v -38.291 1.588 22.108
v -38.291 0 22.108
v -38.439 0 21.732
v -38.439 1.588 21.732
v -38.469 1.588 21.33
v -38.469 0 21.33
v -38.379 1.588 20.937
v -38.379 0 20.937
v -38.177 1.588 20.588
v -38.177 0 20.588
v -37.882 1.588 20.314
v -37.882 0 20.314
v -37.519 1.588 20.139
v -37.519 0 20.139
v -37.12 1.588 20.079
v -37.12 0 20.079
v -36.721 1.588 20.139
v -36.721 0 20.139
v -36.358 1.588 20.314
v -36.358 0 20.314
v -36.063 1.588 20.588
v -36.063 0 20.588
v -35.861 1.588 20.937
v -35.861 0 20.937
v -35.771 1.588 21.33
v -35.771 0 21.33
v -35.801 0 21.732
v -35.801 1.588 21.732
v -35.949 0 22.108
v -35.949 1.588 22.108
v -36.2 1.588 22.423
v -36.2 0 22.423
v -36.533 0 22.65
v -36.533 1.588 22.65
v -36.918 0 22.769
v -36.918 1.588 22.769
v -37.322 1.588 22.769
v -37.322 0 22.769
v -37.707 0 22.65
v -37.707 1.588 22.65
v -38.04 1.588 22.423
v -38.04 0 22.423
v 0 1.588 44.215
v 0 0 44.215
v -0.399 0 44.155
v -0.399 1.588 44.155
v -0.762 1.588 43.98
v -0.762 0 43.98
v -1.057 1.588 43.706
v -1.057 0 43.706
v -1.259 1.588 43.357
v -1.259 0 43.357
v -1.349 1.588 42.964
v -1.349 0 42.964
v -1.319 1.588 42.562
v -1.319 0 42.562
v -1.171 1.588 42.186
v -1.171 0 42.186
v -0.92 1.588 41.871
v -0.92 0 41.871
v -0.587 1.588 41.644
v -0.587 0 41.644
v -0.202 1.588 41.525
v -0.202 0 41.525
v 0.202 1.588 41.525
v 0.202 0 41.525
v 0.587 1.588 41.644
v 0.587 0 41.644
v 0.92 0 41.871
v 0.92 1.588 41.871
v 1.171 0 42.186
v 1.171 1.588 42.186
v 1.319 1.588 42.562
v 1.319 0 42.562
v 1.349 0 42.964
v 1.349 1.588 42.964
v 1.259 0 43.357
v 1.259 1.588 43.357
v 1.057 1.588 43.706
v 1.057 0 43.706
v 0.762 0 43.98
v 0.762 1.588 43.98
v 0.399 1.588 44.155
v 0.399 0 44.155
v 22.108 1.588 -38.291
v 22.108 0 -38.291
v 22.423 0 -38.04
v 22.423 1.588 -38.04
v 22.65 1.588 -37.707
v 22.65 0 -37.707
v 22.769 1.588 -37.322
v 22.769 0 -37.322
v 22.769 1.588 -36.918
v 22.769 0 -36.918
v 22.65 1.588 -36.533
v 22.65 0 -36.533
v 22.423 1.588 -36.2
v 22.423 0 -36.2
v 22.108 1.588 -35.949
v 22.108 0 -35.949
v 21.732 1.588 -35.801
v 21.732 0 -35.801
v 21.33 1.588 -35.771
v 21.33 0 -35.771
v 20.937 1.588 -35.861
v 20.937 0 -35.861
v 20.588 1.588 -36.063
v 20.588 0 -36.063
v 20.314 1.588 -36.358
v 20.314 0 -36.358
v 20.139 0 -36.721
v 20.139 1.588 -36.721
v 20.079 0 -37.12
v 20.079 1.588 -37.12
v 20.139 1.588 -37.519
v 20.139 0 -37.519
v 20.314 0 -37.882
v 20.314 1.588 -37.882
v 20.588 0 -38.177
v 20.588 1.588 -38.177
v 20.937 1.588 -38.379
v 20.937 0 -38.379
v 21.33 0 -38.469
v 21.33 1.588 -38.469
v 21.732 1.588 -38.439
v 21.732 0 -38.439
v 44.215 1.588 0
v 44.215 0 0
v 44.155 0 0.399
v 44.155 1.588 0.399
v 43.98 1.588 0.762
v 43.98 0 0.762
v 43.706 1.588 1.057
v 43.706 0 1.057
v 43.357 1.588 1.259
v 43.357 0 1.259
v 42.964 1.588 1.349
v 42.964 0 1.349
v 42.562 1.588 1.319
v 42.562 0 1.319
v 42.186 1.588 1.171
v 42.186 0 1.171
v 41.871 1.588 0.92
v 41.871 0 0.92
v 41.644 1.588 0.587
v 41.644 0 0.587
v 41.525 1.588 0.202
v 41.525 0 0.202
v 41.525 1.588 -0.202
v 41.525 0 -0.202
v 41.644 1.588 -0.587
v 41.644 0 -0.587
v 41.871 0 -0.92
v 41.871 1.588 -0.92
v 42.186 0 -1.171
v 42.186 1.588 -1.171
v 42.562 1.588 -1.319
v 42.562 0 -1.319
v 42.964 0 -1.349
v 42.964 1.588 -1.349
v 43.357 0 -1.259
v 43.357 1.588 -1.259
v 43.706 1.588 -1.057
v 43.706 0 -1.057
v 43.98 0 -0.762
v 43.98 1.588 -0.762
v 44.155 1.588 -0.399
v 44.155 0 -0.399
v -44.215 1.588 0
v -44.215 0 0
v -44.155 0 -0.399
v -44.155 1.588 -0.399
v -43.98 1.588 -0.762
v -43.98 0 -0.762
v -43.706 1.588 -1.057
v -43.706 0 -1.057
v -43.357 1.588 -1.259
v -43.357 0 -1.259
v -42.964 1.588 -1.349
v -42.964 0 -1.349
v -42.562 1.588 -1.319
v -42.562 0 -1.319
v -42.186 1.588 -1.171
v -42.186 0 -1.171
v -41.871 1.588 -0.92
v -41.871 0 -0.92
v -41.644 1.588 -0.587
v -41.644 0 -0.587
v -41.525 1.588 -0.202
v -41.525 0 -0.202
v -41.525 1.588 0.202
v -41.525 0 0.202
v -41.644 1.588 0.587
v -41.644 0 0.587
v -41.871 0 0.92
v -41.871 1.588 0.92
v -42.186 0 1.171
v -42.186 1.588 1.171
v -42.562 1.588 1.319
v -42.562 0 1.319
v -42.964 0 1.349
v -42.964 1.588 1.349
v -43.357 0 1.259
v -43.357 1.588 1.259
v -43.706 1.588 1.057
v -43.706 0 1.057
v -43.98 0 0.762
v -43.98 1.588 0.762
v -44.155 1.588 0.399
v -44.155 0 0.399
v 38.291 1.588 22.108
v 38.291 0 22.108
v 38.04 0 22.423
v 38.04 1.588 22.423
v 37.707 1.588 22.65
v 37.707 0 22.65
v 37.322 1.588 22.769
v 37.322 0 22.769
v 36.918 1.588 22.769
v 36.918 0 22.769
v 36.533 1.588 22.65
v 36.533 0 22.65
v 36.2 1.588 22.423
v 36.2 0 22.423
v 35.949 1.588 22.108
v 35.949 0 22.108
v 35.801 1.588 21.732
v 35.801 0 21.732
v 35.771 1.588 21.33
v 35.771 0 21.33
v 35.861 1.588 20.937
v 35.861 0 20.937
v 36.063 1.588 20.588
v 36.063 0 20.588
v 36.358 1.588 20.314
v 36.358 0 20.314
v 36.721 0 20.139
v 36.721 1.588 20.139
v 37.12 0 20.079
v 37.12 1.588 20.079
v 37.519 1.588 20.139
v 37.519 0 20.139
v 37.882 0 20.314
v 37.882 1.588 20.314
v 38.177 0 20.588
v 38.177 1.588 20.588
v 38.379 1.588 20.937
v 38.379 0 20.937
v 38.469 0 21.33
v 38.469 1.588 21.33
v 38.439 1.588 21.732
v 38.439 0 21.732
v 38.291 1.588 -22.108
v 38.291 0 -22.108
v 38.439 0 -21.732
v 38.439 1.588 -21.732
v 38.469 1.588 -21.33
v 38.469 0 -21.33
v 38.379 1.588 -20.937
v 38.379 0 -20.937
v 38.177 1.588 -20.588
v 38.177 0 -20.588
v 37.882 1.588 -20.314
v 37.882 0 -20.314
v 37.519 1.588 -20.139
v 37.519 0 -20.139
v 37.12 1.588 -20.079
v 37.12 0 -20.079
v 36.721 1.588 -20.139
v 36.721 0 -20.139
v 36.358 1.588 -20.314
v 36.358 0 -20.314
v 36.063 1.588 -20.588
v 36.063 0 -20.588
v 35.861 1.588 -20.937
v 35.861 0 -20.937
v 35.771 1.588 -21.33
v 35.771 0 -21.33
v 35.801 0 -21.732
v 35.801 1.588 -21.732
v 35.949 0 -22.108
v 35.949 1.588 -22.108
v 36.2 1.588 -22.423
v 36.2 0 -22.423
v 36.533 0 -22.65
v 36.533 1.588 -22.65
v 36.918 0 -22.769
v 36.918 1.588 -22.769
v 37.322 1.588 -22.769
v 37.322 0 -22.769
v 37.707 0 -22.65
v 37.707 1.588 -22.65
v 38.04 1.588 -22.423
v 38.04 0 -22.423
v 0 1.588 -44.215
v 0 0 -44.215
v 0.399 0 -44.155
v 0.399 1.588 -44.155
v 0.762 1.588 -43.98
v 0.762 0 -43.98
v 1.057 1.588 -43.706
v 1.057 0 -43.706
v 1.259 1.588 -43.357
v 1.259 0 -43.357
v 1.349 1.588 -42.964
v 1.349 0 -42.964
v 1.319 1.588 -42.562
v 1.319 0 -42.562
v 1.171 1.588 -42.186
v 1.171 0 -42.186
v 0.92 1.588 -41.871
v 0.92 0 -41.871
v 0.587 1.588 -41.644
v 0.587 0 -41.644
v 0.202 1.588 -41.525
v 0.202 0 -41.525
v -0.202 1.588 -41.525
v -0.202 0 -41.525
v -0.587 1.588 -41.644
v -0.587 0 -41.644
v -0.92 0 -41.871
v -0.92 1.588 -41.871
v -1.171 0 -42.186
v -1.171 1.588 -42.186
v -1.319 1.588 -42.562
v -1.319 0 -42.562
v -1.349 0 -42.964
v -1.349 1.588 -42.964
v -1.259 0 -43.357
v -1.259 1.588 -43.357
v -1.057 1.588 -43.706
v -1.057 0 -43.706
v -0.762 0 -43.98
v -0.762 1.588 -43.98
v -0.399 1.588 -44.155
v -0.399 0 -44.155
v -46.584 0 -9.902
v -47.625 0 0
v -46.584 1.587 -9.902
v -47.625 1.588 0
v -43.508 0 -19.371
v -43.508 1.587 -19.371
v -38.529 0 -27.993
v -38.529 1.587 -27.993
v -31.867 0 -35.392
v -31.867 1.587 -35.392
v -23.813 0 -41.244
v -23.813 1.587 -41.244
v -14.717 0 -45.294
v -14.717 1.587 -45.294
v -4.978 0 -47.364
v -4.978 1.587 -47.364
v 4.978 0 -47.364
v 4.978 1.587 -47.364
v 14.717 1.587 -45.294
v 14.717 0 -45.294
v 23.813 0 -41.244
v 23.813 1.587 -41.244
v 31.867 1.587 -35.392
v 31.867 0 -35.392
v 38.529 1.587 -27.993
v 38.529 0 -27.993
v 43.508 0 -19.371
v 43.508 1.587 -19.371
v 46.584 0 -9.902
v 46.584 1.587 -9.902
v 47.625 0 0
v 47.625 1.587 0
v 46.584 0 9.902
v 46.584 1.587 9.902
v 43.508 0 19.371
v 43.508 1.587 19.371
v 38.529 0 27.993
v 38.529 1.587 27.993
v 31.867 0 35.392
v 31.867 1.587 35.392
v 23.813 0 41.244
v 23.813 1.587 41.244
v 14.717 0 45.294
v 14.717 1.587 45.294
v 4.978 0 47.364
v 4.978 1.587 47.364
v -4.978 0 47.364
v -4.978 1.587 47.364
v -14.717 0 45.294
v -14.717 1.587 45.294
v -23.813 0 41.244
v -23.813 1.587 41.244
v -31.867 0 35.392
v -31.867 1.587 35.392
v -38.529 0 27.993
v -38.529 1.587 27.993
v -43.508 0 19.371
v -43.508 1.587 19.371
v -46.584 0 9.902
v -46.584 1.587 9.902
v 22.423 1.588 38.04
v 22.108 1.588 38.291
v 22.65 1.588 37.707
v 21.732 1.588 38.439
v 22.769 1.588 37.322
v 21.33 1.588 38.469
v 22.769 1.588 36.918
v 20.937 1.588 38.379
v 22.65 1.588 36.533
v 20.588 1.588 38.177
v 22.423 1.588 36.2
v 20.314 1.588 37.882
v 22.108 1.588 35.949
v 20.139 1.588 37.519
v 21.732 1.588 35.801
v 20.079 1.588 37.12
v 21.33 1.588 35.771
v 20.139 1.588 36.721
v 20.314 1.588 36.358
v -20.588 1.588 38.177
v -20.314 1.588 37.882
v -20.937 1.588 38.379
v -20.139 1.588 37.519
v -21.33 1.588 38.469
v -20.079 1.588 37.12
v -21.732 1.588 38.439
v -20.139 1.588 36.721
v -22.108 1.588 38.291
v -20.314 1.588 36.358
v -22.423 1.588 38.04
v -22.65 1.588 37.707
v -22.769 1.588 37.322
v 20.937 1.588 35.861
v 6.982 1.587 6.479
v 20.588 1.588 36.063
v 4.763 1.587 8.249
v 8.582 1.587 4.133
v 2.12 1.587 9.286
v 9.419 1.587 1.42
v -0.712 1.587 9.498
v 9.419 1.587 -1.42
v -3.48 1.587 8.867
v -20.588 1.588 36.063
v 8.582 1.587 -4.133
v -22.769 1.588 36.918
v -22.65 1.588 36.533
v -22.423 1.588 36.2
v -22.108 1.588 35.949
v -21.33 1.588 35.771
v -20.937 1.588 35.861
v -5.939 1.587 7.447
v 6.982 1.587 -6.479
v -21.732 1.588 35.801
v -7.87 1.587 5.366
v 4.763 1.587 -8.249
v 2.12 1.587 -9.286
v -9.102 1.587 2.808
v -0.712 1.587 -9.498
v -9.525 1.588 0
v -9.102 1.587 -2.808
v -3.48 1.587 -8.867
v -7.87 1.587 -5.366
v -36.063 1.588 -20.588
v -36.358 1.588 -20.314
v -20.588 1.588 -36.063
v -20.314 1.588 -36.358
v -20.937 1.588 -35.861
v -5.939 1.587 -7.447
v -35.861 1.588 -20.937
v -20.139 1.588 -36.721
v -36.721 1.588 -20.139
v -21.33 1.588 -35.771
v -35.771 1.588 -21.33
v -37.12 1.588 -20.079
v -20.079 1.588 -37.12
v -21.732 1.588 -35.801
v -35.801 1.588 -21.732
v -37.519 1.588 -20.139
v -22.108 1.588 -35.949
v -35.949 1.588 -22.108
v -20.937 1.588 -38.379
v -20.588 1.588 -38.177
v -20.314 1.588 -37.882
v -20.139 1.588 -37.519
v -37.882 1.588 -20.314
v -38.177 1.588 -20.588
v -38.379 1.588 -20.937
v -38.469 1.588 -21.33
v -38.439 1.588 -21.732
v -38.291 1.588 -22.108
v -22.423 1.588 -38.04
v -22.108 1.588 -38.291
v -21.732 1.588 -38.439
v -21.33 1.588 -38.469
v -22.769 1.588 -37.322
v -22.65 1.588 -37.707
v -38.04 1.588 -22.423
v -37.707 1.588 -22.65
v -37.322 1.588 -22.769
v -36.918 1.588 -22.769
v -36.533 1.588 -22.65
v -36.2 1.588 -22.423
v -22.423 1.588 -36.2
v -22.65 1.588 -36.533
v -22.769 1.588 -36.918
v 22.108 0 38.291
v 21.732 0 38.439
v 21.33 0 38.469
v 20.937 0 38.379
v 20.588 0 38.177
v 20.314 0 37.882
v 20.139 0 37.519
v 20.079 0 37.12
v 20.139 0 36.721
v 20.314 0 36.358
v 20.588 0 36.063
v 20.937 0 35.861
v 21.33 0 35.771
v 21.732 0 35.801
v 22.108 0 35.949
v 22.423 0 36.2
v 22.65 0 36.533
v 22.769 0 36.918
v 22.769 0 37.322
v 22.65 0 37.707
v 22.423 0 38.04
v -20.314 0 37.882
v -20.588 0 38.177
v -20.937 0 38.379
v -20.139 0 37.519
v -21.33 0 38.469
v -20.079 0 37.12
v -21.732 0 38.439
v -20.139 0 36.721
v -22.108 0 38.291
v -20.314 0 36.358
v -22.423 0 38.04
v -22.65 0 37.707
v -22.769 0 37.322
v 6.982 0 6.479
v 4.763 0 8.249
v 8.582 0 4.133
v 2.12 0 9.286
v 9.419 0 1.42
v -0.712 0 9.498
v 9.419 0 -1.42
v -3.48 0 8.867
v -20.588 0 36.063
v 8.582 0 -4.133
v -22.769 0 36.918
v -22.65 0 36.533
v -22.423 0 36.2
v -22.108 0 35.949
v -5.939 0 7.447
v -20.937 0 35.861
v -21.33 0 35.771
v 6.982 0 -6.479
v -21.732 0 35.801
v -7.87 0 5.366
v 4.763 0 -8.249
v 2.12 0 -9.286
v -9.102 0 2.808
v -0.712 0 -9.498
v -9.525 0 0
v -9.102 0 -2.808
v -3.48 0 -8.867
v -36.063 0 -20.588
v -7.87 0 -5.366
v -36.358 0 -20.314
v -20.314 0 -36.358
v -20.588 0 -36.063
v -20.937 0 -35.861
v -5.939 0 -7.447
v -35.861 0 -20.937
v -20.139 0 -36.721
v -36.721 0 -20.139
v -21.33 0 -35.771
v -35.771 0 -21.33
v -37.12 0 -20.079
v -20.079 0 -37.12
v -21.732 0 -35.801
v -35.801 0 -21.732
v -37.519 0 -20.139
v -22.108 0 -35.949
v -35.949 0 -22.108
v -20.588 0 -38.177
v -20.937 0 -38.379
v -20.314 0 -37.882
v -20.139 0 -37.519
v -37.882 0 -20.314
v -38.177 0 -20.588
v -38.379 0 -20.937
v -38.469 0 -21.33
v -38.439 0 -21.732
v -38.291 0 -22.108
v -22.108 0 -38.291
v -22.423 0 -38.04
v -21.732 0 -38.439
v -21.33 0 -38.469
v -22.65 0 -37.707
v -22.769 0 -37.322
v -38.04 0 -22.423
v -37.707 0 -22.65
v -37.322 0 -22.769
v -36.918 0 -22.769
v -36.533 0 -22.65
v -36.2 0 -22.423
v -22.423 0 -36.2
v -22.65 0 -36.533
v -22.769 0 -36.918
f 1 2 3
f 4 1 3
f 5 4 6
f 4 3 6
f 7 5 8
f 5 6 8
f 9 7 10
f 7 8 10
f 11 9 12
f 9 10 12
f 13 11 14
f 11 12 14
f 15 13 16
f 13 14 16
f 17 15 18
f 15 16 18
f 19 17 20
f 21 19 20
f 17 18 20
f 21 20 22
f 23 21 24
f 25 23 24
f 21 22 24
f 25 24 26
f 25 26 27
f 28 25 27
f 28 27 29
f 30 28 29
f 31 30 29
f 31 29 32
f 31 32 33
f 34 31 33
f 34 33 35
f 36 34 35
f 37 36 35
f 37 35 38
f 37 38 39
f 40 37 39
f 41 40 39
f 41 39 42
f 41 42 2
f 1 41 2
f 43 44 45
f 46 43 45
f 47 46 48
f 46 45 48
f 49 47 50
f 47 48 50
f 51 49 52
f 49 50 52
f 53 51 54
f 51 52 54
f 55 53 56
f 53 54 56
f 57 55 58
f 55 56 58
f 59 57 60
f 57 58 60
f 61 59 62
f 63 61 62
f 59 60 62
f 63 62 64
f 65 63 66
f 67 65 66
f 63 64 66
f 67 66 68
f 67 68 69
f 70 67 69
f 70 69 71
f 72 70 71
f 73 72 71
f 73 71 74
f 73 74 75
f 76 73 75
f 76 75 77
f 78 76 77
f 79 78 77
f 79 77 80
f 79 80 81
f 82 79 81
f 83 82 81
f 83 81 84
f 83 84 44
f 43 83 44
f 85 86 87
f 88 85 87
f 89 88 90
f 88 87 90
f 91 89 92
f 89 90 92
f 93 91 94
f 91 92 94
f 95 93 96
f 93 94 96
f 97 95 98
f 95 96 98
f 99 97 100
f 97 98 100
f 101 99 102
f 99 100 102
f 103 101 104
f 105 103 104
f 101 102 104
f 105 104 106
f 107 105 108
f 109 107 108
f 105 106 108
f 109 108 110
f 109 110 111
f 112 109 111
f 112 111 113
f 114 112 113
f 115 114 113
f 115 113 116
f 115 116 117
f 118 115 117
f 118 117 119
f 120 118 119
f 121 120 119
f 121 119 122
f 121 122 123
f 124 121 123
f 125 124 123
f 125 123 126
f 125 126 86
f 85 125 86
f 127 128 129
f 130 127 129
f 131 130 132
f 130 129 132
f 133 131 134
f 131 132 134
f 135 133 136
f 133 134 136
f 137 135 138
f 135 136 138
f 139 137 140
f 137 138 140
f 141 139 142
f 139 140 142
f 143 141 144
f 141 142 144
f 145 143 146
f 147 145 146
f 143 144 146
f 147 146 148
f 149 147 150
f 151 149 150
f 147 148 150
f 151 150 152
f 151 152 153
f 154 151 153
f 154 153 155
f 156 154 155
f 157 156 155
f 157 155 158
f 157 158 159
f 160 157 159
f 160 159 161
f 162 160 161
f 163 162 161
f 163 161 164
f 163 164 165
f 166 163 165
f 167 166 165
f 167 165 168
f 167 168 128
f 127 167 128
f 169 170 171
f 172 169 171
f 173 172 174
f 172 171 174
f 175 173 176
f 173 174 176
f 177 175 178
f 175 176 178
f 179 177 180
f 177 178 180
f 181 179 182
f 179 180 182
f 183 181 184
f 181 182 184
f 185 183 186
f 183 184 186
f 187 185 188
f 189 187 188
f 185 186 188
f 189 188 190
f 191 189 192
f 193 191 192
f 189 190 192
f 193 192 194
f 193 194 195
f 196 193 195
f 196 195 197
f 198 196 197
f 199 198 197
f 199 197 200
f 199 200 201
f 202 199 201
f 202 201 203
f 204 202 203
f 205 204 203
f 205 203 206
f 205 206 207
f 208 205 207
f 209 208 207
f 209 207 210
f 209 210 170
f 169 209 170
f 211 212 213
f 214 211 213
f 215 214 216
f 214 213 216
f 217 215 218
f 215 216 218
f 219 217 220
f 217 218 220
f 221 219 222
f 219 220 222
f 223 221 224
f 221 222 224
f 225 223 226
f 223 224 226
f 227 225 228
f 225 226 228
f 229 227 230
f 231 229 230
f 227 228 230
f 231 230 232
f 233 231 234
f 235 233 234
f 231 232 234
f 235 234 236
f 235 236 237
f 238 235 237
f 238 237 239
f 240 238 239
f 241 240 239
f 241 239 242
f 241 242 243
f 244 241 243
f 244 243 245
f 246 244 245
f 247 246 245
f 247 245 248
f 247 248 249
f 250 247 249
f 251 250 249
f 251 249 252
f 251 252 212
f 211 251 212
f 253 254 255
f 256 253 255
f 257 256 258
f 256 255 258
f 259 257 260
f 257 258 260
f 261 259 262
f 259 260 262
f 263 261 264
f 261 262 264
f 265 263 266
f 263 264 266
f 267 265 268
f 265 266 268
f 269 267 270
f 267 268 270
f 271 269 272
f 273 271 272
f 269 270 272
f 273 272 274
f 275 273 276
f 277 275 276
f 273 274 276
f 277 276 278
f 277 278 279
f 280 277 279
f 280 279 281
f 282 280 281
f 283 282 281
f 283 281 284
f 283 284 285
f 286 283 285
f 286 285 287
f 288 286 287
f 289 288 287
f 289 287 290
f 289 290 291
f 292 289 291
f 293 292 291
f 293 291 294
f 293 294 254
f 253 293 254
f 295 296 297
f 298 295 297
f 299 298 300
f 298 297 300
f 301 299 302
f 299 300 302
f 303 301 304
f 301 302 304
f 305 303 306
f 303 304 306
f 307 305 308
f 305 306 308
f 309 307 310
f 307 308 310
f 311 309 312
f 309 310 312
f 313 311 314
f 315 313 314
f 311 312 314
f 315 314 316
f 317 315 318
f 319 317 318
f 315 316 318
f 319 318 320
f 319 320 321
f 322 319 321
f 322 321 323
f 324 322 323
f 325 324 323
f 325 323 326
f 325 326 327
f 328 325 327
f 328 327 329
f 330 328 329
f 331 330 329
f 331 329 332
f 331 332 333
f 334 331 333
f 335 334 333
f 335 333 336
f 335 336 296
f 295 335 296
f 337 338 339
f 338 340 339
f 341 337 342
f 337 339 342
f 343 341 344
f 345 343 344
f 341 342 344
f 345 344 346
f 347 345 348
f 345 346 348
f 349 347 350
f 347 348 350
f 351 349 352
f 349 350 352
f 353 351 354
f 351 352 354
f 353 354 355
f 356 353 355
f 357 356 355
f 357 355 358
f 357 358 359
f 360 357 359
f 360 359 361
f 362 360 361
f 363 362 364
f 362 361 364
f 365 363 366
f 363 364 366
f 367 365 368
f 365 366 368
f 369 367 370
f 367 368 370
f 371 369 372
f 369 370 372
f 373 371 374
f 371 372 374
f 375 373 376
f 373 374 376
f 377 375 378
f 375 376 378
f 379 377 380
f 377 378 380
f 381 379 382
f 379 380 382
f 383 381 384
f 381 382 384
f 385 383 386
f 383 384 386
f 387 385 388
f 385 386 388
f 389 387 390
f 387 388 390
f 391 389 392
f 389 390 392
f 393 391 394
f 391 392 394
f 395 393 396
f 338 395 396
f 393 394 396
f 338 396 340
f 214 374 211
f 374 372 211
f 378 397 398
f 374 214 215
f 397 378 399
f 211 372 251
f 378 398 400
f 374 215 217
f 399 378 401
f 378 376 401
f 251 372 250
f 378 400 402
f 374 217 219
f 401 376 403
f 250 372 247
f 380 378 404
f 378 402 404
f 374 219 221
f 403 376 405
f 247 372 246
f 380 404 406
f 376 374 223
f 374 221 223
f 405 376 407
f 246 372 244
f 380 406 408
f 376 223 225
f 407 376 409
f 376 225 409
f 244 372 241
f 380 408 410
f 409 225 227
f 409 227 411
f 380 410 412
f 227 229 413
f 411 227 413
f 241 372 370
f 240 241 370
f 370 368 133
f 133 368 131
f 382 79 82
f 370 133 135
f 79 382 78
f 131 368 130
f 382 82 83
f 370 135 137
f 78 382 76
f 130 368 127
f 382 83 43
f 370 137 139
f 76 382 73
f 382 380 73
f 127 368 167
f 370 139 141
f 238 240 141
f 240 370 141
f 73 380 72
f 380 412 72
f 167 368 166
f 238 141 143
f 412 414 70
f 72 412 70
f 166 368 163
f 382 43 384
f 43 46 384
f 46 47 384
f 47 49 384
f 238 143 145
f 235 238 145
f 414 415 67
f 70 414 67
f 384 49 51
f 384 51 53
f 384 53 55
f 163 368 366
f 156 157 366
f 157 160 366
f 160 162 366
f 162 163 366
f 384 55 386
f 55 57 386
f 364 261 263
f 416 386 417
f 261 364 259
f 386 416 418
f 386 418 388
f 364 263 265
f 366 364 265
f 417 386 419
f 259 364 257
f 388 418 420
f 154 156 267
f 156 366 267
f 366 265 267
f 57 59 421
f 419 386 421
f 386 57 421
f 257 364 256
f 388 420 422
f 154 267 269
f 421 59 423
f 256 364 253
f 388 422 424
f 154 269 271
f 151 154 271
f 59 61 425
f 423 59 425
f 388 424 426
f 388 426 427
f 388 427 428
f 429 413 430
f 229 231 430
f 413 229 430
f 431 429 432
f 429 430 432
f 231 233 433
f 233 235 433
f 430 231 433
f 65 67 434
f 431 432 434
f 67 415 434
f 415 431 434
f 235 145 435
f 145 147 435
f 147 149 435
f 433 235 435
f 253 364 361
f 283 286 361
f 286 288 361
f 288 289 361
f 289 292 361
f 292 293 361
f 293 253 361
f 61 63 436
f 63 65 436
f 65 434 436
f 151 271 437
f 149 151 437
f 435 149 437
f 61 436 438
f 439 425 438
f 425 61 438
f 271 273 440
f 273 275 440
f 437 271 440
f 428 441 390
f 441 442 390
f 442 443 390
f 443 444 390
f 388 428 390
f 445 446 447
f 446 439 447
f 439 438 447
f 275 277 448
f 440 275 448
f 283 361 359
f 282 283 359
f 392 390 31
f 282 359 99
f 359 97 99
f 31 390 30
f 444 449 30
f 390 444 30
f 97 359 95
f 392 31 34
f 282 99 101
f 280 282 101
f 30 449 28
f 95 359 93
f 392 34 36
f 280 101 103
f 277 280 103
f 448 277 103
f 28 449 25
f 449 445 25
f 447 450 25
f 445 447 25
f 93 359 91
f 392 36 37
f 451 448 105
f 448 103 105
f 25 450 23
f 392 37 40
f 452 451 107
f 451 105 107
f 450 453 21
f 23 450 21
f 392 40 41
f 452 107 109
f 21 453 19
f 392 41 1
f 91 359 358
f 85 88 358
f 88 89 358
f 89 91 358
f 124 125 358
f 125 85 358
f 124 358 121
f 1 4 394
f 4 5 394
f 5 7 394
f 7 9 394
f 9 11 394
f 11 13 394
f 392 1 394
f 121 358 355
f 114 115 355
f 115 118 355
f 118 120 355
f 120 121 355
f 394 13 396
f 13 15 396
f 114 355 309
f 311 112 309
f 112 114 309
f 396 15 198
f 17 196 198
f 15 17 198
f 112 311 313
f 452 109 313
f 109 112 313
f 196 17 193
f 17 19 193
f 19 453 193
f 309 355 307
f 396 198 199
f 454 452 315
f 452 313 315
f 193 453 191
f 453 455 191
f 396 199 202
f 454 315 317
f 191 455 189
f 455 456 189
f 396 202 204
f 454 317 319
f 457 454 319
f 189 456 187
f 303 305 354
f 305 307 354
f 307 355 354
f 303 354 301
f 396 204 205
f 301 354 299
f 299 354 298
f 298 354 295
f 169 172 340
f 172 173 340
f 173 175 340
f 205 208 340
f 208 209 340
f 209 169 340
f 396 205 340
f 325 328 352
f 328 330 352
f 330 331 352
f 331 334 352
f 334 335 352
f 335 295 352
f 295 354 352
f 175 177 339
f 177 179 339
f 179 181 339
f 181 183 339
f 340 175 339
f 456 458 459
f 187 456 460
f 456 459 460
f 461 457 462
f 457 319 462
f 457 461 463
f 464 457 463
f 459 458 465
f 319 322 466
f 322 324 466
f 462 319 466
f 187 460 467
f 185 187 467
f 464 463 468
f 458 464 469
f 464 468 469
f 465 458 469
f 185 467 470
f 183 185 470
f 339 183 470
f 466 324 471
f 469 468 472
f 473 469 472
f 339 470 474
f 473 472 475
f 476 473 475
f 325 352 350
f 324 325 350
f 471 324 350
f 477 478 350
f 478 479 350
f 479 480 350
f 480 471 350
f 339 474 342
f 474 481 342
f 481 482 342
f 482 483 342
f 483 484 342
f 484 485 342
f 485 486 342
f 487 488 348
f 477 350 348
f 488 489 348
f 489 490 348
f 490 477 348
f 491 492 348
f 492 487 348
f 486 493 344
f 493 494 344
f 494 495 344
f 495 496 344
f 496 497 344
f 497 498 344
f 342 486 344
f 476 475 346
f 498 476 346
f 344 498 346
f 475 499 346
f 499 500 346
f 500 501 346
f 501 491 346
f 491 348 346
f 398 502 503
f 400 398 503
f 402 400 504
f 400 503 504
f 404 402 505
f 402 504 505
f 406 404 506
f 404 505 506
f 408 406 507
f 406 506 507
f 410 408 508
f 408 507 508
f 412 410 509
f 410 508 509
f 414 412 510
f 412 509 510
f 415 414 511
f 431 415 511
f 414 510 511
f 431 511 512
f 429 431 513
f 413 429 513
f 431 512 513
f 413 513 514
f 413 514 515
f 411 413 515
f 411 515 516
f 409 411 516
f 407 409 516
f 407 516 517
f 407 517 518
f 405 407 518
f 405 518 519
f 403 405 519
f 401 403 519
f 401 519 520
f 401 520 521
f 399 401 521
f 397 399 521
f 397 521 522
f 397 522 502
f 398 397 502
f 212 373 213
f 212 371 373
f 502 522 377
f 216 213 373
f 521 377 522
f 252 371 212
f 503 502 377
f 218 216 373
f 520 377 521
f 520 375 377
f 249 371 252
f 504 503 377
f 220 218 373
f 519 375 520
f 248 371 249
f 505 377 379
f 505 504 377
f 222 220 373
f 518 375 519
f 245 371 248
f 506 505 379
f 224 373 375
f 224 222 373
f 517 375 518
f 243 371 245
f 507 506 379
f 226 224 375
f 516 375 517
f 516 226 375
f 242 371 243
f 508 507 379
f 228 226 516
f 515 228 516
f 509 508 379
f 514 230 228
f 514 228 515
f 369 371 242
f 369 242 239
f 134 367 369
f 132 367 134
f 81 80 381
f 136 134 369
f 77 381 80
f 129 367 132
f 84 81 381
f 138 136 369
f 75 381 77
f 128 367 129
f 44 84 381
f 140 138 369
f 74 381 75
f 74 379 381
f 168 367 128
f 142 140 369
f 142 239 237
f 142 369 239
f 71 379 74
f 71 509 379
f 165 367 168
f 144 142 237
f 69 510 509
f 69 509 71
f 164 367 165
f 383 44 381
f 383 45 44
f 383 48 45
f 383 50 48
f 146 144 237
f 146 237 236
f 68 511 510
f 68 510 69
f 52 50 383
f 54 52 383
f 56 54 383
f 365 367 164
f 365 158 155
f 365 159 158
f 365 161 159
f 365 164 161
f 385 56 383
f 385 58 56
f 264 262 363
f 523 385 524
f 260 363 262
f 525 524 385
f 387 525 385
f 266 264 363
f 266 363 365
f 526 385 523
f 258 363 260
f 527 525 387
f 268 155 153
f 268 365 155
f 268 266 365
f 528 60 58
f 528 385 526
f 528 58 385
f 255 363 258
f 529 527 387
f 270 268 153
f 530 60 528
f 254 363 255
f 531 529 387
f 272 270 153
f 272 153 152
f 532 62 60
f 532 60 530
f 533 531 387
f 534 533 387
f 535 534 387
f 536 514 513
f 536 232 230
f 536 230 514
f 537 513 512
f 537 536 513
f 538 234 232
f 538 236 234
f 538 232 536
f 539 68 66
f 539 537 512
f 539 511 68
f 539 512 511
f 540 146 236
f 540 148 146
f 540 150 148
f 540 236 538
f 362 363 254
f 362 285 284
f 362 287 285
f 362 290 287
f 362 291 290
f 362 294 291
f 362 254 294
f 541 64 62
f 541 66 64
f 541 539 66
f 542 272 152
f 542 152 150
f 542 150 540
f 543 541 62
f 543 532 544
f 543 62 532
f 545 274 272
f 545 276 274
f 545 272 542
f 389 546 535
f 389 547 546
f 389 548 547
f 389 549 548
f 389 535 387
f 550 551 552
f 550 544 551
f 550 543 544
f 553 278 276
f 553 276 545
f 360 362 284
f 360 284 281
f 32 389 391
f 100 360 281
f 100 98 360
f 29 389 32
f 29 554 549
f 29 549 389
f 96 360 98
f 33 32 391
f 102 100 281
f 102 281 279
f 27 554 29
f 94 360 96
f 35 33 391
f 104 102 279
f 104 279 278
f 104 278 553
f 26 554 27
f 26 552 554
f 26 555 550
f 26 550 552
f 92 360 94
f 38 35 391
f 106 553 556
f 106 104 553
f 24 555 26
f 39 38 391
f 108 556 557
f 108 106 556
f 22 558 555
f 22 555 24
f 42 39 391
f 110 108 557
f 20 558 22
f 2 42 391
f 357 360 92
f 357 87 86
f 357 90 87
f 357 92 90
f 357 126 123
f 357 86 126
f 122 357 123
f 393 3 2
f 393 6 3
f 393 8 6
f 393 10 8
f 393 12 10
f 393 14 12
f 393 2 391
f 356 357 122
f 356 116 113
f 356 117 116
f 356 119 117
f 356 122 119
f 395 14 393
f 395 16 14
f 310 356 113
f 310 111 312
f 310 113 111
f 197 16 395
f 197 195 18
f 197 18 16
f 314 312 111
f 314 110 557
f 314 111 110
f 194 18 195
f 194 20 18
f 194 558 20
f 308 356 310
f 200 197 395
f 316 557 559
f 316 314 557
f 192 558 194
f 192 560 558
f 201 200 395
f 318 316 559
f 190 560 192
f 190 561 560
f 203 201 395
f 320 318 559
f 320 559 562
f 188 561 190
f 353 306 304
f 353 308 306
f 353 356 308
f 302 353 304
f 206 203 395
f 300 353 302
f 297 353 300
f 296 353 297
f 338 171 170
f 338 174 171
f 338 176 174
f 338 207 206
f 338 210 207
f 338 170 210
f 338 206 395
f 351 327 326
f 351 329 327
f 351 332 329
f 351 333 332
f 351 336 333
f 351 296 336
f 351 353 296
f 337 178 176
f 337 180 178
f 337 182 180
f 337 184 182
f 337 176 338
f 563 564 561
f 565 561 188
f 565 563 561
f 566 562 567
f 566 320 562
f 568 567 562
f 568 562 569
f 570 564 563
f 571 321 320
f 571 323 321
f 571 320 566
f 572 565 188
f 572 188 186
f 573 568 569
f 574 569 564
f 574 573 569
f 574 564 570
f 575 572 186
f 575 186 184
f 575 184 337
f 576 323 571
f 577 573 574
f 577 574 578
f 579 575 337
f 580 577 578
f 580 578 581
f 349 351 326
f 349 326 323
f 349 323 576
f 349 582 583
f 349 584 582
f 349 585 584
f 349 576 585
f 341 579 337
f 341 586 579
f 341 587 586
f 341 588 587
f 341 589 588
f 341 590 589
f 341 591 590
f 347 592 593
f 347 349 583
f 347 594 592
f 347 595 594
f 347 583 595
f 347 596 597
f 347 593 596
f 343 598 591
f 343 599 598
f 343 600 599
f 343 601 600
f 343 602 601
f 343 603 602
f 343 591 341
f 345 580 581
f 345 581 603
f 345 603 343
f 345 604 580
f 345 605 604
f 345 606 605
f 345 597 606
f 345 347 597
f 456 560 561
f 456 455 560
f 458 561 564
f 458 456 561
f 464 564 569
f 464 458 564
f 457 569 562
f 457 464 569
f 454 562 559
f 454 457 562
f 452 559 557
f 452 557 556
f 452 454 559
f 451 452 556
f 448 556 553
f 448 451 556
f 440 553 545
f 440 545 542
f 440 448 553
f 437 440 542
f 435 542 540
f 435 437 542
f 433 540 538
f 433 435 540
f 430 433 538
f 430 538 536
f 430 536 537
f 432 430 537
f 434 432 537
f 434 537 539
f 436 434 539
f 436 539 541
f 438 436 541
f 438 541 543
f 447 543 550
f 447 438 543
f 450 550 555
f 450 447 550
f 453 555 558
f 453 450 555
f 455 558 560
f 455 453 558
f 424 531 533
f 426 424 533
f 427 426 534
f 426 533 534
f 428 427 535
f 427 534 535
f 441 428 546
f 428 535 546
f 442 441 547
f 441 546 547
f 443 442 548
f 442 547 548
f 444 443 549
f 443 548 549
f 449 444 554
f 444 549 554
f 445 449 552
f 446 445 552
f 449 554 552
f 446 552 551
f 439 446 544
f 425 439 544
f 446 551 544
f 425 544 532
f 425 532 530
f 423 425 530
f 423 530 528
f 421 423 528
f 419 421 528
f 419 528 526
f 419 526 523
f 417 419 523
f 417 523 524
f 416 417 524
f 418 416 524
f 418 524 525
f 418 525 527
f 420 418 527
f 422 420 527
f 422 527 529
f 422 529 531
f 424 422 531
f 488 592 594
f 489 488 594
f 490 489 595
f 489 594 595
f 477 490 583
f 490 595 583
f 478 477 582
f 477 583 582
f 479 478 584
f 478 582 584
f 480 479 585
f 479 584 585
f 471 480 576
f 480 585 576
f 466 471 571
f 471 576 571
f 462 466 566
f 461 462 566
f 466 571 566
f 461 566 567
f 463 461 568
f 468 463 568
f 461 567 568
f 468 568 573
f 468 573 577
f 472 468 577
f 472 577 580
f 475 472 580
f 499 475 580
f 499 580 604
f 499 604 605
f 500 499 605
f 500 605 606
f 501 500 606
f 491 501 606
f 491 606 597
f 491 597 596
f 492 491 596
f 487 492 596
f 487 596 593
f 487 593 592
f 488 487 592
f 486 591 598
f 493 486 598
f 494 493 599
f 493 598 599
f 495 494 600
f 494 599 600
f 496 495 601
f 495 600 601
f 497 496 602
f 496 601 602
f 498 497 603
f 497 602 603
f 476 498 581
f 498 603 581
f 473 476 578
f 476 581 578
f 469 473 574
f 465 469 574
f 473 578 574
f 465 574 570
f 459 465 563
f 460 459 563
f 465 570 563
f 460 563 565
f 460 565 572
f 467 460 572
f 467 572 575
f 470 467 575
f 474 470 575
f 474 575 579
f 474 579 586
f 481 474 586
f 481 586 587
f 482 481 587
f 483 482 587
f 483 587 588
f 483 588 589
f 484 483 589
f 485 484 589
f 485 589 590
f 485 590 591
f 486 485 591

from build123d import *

# Parameters (mm, degrees)
SKETCH1_W                    = 38.1
SKETCH1_H                    = 1.5875
F_36_0_1065_DIAMETER_HOLE1_D = 2.7051
CIRPATTERN1_COUNT            = 12


with BuildPart() as part:
    # Sketch1 → Revolve1 (revolve)
    with BuildSketch(Plane.XY):
        with Locations((-28.575, 0.79375)):
            Rectangle(SKETCH1_W, SKETCH1_H)
    revolve(axis=Axis((0, 55, 0), (0, -1, 0)))

    # #36 (0.1065) Diameter Hole1 (through all)
    with Locations(Plane(origin=(0, 1.5875, 0), x_dir=(1, 0, 0), z_dir=(0, 1, 0))):
        with Locations((-42.8625, 0)):
            f_36_0_1065_diameter_hole1 = Hole(F_36_0_1065_DIAMETER_HOLE1_D / 2)

    # CirPattern1: #36 (0.1065) Diameter Hole1 ×12 about axis
    cirpattern1_axis = Axis((0, 0, 0), (0, 1, 0))
    for i in range(1, CIRPATTERN1_COUNT):
        add(f_36_0_1065_diameter_hole1.rotate(cirpattern1_axis, i * 360 / CIRPATTERN1_COUNT), mode=Mode.SUBTRACT)


solid = part.part
